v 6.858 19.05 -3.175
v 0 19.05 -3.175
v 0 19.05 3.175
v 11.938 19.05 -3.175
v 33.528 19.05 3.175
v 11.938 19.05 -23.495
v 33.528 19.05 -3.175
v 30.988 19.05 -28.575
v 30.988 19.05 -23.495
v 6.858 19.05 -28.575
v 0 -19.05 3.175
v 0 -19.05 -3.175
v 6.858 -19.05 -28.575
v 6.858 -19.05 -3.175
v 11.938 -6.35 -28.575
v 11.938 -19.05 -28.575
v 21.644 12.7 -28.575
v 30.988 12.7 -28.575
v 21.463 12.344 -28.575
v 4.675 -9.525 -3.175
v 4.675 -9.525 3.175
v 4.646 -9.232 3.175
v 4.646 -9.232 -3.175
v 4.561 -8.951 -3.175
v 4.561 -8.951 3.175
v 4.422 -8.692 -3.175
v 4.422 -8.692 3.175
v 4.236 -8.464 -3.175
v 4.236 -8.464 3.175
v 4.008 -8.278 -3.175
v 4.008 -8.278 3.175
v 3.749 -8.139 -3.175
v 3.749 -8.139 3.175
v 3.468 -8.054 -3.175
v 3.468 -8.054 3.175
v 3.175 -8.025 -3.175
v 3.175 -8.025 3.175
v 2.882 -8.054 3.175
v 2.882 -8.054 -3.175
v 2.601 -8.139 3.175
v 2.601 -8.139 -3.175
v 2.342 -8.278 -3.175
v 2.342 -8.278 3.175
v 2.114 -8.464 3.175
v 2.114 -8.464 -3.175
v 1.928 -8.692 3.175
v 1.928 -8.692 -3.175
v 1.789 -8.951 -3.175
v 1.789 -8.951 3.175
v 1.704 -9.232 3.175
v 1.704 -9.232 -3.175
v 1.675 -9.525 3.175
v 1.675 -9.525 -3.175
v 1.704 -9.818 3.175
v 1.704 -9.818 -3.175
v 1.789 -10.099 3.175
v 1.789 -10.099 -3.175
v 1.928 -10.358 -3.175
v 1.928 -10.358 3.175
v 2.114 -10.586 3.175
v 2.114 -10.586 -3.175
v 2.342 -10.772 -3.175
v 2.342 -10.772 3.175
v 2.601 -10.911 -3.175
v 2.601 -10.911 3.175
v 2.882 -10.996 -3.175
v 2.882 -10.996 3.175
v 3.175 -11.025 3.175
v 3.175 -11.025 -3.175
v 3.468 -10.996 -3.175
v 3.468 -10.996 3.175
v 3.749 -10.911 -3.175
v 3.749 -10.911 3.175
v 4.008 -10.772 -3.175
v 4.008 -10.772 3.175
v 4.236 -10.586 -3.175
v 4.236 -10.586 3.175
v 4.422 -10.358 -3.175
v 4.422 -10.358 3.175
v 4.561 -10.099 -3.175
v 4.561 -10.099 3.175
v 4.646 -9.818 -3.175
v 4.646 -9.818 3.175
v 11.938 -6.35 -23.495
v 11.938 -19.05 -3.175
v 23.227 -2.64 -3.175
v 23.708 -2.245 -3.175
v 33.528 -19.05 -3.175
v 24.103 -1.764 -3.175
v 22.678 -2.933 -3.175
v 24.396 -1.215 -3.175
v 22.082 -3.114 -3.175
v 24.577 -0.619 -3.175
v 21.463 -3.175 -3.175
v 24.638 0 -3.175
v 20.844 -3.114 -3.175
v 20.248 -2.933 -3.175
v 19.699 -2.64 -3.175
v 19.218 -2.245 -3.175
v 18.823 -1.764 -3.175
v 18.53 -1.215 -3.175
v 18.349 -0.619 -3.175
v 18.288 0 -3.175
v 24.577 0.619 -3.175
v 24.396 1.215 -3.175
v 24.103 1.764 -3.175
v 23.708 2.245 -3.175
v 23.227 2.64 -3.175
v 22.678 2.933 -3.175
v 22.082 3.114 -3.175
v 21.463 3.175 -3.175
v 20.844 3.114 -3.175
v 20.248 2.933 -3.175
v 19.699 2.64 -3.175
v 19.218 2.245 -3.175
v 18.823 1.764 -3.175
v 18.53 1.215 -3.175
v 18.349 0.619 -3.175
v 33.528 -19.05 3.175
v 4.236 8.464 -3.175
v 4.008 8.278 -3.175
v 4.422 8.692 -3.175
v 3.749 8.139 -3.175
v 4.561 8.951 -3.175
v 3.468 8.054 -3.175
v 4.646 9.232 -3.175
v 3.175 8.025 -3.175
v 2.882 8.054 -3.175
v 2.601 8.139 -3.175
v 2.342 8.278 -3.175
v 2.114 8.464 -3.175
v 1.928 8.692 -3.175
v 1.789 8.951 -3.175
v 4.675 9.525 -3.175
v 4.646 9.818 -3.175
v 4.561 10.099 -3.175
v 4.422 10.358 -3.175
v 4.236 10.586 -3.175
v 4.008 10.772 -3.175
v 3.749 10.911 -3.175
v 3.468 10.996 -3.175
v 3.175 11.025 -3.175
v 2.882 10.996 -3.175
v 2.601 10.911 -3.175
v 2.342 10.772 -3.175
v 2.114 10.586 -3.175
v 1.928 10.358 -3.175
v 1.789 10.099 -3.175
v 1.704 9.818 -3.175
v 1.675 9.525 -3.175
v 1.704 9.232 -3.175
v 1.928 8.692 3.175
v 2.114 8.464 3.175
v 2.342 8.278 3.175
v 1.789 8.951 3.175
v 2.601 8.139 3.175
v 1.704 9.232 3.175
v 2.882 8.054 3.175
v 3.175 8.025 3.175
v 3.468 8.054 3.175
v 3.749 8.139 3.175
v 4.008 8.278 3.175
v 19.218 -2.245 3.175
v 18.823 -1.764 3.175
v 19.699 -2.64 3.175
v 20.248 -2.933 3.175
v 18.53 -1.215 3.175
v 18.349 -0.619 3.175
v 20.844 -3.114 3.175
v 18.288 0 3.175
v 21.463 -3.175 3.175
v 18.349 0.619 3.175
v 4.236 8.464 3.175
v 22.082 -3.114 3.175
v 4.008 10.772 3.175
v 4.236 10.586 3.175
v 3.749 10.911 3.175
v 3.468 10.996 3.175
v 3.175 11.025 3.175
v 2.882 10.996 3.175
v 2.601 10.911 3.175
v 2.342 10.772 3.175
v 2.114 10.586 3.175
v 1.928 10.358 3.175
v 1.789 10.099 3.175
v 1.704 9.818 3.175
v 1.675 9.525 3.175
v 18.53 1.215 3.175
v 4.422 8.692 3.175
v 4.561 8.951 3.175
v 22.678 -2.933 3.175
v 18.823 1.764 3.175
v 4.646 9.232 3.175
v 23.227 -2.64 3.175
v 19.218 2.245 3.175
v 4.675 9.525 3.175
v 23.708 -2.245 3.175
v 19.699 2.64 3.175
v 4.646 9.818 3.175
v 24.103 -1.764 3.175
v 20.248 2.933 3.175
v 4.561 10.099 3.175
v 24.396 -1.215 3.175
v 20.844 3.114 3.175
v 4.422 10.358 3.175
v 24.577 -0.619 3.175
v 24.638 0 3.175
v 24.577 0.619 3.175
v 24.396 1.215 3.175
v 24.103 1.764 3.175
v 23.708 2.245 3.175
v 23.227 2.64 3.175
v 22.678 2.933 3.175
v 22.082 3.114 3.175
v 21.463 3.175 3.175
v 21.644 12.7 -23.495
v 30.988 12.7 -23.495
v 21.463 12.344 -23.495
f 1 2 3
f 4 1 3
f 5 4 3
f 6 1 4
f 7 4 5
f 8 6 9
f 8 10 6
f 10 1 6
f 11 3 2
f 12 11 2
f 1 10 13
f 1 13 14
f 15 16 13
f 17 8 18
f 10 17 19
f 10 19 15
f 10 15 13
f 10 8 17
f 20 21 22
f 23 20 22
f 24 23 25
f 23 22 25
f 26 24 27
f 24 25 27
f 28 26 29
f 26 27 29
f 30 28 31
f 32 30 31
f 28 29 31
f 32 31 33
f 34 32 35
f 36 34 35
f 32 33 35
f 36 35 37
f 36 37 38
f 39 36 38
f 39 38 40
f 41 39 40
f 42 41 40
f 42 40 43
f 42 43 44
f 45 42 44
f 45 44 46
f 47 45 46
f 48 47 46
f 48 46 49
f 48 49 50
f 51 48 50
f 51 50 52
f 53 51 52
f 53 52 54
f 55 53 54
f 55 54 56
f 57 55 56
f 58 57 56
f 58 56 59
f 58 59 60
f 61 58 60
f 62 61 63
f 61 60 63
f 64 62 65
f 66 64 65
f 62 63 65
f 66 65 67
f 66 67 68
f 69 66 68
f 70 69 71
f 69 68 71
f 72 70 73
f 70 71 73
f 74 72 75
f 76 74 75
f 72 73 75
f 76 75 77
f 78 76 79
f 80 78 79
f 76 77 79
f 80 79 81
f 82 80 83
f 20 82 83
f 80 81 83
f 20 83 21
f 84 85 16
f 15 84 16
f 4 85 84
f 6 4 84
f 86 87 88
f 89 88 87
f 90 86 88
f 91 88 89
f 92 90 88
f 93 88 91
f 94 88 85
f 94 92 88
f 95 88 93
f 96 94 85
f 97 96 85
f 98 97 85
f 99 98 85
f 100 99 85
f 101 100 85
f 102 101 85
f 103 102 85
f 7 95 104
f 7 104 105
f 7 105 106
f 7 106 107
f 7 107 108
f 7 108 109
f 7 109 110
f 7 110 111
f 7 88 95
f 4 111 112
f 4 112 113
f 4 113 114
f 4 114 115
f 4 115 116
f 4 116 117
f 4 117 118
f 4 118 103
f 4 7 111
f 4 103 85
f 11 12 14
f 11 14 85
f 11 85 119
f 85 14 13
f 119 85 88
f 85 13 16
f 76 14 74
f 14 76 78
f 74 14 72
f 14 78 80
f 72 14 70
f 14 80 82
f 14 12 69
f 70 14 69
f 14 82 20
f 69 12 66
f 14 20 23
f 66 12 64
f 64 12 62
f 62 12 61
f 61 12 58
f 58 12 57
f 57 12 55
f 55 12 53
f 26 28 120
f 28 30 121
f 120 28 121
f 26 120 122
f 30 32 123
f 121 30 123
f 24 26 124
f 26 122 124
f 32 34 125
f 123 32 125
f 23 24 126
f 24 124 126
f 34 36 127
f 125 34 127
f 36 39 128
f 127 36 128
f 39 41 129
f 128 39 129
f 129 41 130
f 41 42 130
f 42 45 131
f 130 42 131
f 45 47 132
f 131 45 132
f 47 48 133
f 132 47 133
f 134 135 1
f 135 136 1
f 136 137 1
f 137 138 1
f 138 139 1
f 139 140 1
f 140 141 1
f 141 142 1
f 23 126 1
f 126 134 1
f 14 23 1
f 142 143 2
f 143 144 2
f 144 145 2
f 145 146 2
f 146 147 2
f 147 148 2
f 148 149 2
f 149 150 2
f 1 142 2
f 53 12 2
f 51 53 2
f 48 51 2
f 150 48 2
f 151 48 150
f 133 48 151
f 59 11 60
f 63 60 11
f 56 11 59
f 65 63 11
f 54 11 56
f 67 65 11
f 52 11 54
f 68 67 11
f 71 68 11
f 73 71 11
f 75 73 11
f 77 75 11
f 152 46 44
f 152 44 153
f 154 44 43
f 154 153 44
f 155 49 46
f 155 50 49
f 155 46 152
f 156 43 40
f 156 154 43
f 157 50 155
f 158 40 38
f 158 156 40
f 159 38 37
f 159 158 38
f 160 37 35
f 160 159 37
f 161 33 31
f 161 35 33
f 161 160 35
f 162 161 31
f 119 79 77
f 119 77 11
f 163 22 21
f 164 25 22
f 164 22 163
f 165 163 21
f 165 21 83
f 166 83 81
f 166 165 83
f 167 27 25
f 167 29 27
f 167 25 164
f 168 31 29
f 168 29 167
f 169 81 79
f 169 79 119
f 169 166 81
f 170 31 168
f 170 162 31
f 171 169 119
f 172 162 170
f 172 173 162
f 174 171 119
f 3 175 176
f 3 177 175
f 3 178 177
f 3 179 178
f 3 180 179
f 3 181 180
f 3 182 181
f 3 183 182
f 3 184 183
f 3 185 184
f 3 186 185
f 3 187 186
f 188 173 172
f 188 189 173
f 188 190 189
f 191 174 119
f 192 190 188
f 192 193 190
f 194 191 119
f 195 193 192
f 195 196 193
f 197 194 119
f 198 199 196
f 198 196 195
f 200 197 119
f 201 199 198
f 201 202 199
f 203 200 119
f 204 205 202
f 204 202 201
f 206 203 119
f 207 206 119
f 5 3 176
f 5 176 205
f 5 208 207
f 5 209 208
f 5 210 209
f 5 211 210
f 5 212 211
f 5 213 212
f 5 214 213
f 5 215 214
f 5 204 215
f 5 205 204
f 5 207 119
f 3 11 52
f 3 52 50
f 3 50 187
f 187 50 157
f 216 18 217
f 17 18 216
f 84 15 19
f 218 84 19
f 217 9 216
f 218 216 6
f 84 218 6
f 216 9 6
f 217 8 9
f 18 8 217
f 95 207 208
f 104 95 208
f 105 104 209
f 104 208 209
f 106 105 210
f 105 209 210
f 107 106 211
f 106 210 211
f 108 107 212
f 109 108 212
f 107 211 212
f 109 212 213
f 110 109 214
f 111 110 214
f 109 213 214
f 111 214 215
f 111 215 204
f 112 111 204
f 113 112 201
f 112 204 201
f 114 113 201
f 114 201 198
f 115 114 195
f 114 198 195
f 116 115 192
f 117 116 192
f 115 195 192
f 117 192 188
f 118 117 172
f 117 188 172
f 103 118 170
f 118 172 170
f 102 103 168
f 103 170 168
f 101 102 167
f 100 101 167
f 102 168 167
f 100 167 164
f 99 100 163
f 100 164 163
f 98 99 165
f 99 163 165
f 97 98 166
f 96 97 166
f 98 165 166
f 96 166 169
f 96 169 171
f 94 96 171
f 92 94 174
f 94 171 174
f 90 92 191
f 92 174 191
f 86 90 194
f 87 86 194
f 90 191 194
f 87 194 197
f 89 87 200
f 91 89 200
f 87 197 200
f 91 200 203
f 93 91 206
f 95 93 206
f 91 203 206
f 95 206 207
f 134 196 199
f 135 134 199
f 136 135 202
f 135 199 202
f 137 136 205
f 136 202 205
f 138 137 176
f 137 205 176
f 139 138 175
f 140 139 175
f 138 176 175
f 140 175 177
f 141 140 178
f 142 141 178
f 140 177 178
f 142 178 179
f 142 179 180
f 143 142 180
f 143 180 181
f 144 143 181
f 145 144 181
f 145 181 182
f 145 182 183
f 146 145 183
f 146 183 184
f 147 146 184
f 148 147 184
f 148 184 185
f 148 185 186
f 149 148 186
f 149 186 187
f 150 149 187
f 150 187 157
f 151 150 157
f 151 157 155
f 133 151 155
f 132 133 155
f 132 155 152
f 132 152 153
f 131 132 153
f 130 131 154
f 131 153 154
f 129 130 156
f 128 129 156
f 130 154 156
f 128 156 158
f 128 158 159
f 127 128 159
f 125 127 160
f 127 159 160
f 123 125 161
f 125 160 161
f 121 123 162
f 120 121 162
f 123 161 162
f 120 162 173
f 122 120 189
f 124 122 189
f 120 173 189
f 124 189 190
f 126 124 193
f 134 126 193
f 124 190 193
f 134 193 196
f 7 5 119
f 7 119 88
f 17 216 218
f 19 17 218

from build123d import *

# Parameters (mm, degrees)
SKETCH2_W           = 6.35
SKETCH2_H           = 38.1
BOSS_EXTRUDE1_DEPTH = 19.05
SKETCH3_R           = 1.5
CUT_EXTRUDE1_DEPTH  = 28.679008291
SKETCH4_W           = 14.478
SKETCH4_H           = 6.35
SKETCH4_W_2         = 9.525
SKETCH4_H_2         = 5.08
BOSS_EXTRUDE2_DEPTH = 38.1
SKETCH5_R           = 3.175
CUT_EXTRUDE2_DEPTH  = 6.35
CUT_EXTRUDE3_DEPTH  = 5.08
BOSS_EXTRUDE3_DEPTH = 5.08


with BuildPart() as part:
    # Sketch2 → Boss-Extrude1 (new body)
    with BuildSketch(Plane(origin=(0, 0, 0), x_dir=(0, 0, -1), z_dir=(1, 0, 0))):
        Rectangle(SKETCH2_W, SKETCH2_H)
    extrude(amount=BOSS_EXTRUDE1_DEPTH)

    # Sketch3 → Cut-Extrude1 (cut, through all)
    with BuildSketch(Plane.XY.offset(3.175)):
        with Locations((3.175, 9.525)):
            Circle(SKETCH3_R)
        with Locations((3.175, -9.525)):
            Circle(SKETCH3_R)
    extrude(amount=-CUT_EXTRUDE1_DEPTH, mode=Mode.SUBTRACT)

    # Sketch4 → Boss-Extrude2 (add)
    with BuildSketch(Plane(origin=(0, 19.05, 0), x_dir=(1, 0, 0), z_dir=(0, 1, 0))):
        with Locations((26.289, 0)):
            Rectangle(SKETCH4_W, SKETCH4_H)
        Polygon((6.858, 3.175), (6.858, -3.175), (19.05, -3.175), (19.05, 3.175), (11.938, 3.175), align=None)
        Polygon((6.858, 28.575), (6.858, 3.175), (11.938, 3.175), (11.938, 23.495), (11.938, 28.575), align=None)
        with Locations((16.7005, 26.035)):
            Rectangle(SKETCH4_W_2, SKETCH4_H_2)
    extrude(amount=-BOSS_EXTRUDE2_DEPTH)

    # Sketch5 → Cut-Extrude2 (cut)
    with BuildSketch(Plane.XY.offset(3.175)):
        with Locations((21.463, 0)):
            Circle(SKETCH5_R)
    extrude(amount=-CUT_EXTRUDE2_DEPTH, mode=Mode.SUBTRACT)

    # Sketch6 → Cut-Extrude3 (cut)
    with BuildSketch(Plane(origin=(0, 0, -28.575), x_dir=(-1, 0, 0), z_dir=(0, 0, -1))):
        Polygon((-21.463, -19.05), (-11.938, -19.05), (-11.938, -6.35), (-21.463, 12.343865065), align=None)
    extrude(amount=-CUT_EXTRUDE3_DEPTH, mode=Mode.SUBTRACT)

    # Sketch6<3> → Boss-Extrude3 (add)
    with BuildSketch(Plane(origin=(0, 0, -28.575), x_dir=(-1, 0, 0), z_dir=(0, 0, -1))):
        Polygon((-21.463, 12.343865065), (-21.463, 19.05), (-30.988, 19.05), (-30.988, 12.7), (-21.644459813, 12.7), align=None)
    extrude(amount=-BOSS_EXTRUDE3_DEPTH)


solid = part.part
